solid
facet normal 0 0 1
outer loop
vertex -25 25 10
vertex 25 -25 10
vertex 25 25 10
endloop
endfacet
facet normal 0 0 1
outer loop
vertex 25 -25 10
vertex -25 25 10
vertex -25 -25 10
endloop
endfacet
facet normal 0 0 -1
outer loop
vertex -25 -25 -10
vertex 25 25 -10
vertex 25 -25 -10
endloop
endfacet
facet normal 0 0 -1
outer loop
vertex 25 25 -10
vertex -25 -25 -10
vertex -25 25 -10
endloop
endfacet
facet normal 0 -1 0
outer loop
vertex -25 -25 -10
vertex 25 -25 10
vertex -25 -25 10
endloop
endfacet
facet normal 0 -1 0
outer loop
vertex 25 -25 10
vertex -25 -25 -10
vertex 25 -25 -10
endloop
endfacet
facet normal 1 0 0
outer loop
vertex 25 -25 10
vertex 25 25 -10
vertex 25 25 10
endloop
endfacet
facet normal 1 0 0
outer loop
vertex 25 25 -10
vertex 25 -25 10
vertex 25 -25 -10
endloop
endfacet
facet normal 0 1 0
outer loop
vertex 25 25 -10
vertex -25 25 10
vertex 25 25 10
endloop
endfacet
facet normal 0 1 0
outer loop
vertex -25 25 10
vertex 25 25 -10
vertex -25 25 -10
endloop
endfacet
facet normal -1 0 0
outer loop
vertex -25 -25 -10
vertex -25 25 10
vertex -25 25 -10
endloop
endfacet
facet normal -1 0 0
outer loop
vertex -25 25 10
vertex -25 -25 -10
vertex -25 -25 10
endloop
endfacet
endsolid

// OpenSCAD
// Parameters
body_length = 50; //[25:100:1]
body_width  = 50; //[25:100:1]
body_height = 20; //[10:40:1]

$fn = 64;

// Main Body (single connected solid, centered)
module main_body() {
  color([0.85, 0.85, 0.8])
    cube([body_length, body_width, body_height], center=true);
}

// Final Model
main_body();
